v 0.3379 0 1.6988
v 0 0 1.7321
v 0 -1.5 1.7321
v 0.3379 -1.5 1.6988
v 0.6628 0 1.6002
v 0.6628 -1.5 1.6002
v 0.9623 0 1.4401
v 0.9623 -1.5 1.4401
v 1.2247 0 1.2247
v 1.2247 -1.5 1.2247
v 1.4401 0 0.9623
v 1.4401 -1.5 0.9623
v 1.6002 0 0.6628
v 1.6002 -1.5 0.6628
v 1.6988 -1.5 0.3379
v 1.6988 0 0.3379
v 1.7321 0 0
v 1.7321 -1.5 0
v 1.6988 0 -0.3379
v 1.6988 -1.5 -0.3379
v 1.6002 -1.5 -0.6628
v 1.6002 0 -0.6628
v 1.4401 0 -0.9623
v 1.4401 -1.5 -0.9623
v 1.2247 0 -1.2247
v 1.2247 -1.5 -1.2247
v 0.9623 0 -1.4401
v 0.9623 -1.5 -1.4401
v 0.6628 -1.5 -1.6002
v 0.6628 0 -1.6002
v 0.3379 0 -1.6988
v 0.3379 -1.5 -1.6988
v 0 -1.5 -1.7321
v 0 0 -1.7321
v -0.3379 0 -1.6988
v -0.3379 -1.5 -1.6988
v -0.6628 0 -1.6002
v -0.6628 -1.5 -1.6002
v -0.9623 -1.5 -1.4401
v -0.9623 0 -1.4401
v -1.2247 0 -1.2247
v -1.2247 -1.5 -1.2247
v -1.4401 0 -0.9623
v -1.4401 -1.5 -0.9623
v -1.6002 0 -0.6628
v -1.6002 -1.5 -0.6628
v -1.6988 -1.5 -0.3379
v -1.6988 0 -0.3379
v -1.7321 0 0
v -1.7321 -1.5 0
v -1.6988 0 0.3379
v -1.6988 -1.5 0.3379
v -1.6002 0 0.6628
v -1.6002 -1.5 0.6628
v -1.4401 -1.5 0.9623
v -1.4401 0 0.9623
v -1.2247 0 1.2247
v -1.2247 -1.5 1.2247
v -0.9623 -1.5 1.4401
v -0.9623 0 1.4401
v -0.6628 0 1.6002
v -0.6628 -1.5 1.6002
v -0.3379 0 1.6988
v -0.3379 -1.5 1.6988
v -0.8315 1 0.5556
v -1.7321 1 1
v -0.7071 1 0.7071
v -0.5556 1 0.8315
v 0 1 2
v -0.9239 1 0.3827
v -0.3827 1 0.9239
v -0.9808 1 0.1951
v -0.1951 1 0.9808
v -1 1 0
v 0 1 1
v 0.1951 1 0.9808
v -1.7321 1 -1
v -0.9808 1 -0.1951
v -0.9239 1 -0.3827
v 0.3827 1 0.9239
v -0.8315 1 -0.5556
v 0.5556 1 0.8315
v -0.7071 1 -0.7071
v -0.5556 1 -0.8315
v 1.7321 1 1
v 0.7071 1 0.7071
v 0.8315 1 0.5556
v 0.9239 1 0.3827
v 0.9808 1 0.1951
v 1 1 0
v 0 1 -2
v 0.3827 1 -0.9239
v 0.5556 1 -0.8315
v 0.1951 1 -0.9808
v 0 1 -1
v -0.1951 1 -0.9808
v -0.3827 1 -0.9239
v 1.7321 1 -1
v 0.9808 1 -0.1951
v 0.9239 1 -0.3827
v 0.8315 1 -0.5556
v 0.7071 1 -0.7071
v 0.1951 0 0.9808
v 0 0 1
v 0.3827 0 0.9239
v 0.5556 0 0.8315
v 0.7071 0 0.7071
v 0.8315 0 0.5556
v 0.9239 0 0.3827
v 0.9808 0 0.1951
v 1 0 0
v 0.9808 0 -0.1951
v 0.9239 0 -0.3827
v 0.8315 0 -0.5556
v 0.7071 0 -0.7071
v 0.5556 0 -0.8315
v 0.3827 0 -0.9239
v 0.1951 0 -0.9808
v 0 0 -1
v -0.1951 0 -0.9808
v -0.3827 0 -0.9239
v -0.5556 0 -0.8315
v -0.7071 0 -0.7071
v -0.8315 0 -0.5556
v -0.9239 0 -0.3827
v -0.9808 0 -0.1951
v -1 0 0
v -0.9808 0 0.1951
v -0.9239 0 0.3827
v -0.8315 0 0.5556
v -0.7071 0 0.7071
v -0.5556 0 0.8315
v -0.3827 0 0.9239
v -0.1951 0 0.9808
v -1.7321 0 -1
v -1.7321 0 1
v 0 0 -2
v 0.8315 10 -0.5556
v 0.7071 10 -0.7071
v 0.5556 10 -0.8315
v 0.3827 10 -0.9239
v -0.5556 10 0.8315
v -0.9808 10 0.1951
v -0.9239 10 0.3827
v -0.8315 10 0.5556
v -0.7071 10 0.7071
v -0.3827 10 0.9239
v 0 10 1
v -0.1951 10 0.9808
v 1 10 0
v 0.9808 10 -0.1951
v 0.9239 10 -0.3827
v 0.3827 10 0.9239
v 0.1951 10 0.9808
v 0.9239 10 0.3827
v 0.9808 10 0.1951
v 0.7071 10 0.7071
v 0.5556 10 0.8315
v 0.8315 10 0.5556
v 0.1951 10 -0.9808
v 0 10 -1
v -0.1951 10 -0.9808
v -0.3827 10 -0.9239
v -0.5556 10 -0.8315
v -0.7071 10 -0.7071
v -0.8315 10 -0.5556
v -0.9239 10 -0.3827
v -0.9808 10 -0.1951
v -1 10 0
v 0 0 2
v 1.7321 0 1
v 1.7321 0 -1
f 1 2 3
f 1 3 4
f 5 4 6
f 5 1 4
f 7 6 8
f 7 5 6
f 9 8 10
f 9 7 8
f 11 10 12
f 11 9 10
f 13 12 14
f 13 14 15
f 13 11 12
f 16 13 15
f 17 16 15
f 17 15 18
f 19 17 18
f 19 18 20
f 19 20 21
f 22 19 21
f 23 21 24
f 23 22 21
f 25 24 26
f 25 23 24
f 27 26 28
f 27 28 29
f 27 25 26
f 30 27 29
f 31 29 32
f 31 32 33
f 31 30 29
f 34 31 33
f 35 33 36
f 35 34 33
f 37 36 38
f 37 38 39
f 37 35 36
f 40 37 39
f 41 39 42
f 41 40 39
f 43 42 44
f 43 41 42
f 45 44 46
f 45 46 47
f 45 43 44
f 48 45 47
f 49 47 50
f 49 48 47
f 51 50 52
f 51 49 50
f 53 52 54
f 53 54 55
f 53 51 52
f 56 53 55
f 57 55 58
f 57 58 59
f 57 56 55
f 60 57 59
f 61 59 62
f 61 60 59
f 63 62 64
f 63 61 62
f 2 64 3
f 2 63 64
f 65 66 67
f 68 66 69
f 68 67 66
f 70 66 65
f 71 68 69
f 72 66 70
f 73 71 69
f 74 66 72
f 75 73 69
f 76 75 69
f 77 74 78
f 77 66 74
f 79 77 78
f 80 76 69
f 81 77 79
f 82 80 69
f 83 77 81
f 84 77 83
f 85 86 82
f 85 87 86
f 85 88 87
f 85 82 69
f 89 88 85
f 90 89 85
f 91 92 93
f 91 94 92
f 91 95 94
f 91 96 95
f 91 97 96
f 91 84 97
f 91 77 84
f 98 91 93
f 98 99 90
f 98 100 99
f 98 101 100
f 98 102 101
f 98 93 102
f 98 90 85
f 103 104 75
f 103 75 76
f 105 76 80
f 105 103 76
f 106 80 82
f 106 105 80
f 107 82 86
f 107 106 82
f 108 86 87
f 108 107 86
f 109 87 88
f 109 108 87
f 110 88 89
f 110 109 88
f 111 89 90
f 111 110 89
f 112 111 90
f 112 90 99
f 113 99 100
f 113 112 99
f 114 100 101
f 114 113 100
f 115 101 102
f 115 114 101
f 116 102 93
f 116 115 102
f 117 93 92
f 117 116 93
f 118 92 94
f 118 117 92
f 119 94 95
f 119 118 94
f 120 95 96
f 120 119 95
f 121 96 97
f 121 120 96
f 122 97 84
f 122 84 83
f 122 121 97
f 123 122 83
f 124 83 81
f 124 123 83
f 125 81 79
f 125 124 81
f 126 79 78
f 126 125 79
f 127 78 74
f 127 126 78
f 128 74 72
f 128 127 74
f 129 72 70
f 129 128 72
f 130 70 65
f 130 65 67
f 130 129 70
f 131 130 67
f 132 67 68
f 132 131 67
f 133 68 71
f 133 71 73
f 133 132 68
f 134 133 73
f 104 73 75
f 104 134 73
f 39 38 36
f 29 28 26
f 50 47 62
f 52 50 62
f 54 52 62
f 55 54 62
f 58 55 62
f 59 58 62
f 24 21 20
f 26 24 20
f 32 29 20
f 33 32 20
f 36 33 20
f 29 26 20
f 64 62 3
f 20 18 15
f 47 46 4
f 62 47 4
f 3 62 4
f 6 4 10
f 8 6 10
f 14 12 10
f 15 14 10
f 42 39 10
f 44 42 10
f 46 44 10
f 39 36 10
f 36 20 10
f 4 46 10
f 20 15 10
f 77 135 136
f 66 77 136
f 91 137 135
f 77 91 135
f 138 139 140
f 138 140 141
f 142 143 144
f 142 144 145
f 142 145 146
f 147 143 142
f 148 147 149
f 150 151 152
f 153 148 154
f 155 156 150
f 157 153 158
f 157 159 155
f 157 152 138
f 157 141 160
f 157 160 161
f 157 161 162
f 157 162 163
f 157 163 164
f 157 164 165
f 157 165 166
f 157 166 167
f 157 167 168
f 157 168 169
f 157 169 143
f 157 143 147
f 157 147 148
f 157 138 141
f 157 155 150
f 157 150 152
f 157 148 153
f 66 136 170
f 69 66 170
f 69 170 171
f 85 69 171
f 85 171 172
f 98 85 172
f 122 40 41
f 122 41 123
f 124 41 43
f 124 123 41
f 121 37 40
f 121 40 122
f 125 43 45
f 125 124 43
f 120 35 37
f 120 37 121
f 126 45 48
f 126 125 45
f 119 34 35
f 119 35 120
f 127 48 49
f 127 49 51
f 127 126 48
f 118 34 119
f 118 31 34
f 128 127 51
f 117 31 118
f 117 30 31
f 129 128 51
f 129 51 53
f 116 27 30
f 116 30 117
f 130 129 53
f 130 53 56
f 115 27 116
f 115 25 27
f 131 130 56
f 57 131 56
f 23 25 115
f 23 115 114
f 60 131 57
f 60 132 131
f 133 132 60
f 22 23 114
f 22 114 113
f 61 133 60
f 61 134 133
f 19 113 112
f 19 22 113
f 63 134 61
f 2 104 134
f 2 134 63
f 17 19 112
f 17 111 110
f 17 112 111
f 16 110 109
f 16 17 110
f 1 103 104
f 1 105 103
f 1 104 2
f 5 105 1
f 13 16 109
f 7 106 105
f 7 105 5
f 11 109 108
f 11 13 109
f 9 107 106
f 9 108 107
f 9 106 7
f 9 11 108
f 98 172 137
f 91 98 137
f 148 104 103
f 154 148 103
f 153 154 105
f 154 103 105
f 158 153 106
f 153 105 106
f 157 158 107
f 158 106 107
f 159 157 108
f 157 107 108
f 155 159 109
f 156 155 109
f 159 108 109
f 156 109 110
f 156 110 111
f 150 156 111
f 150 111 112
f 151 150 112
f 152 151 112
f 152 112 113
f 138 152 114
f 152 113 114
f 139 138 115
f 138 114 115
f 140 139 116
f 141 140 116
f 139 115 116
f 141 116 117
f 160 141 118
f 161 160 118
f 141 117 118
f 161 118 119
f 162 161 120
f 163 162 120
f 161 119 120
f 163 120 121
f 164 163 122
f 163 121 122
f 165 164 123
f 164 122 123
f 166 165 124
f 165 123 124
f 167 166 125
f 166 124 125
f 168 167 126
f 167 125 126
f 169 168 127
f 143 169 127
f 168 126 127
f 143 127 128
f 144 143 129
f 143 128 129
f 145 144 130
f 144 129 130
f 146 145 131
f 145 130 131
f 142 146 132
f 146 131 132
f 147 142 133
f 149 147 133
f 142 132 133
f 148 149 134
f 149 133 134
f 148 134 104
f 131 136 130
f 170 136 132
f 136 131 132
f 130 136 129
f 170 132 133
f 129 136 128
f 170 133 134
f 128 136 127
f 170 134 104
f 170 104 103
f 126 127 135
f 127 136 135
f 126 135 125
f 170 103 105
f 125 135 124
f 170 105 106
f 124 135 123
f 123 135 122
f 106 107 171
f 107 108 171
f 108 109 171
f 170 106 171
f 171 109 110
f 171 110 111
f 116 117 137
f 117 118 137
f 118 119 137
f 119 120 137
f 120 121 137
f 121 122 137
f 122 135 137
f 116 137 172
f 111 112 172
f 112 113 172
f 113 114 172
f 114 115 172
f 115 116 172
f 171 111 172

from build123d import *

# Parameters (mm, degrees)
SKETCH1_R           = 1
BOSS_EXTRUDE1_DEPTH = 10
SKETCH1_4_R         = 1.732050808
BOSS_EXTRUDE2_DEPTH = 1.5
SKETCH1_5_R         = 1
BOSS_EXTRUDE3_DEPTH = 1


with BuildPart() as part:
    # Sketch1 → Boss-Extrude1 (new body)
    with BuildSketch(Plane(origin=(0, 0, 0), x_dir=(1, 0, 0), z_dir=(0, 1, 0))):
        Circle(SKETCH1_R)
    extrude(amount=BOSS_EXTRUDE1_DEPTH)

    # Sketch1<4> → Boss-Extrude2 (add)
    with BuildSketch(Plane(origin=(0, 0, 0), x_dir=(1, 0, 0), z_dir=(0, 1, 0))):
        Circle(SKETCH1_4_R)
    extrude(amount=-BOSS_EXTRUDE2_DEPTH)


with BuildPart() as body_2:
    # Sketch1<5> → Boss-Extrude3 (new body)
    with BuildSketch(Plane(origin=(0, 0, 0), x_dir=(1, 0, 0), z_dir=(0, 1, 0))):
        Polygon((0, 2), (-1.732050808, 1), (-1.732050808, -1), (0, -2), (1.732050808, -1), (1.732050808, 1), align=None)
        Circle(SKETCH1_5_R, mode=Mode.SUBTRACT)
    extrude(amount=BOSS_EXTRUDE3_DEPTH)


solid = Compound([part.part, body_2.part])
